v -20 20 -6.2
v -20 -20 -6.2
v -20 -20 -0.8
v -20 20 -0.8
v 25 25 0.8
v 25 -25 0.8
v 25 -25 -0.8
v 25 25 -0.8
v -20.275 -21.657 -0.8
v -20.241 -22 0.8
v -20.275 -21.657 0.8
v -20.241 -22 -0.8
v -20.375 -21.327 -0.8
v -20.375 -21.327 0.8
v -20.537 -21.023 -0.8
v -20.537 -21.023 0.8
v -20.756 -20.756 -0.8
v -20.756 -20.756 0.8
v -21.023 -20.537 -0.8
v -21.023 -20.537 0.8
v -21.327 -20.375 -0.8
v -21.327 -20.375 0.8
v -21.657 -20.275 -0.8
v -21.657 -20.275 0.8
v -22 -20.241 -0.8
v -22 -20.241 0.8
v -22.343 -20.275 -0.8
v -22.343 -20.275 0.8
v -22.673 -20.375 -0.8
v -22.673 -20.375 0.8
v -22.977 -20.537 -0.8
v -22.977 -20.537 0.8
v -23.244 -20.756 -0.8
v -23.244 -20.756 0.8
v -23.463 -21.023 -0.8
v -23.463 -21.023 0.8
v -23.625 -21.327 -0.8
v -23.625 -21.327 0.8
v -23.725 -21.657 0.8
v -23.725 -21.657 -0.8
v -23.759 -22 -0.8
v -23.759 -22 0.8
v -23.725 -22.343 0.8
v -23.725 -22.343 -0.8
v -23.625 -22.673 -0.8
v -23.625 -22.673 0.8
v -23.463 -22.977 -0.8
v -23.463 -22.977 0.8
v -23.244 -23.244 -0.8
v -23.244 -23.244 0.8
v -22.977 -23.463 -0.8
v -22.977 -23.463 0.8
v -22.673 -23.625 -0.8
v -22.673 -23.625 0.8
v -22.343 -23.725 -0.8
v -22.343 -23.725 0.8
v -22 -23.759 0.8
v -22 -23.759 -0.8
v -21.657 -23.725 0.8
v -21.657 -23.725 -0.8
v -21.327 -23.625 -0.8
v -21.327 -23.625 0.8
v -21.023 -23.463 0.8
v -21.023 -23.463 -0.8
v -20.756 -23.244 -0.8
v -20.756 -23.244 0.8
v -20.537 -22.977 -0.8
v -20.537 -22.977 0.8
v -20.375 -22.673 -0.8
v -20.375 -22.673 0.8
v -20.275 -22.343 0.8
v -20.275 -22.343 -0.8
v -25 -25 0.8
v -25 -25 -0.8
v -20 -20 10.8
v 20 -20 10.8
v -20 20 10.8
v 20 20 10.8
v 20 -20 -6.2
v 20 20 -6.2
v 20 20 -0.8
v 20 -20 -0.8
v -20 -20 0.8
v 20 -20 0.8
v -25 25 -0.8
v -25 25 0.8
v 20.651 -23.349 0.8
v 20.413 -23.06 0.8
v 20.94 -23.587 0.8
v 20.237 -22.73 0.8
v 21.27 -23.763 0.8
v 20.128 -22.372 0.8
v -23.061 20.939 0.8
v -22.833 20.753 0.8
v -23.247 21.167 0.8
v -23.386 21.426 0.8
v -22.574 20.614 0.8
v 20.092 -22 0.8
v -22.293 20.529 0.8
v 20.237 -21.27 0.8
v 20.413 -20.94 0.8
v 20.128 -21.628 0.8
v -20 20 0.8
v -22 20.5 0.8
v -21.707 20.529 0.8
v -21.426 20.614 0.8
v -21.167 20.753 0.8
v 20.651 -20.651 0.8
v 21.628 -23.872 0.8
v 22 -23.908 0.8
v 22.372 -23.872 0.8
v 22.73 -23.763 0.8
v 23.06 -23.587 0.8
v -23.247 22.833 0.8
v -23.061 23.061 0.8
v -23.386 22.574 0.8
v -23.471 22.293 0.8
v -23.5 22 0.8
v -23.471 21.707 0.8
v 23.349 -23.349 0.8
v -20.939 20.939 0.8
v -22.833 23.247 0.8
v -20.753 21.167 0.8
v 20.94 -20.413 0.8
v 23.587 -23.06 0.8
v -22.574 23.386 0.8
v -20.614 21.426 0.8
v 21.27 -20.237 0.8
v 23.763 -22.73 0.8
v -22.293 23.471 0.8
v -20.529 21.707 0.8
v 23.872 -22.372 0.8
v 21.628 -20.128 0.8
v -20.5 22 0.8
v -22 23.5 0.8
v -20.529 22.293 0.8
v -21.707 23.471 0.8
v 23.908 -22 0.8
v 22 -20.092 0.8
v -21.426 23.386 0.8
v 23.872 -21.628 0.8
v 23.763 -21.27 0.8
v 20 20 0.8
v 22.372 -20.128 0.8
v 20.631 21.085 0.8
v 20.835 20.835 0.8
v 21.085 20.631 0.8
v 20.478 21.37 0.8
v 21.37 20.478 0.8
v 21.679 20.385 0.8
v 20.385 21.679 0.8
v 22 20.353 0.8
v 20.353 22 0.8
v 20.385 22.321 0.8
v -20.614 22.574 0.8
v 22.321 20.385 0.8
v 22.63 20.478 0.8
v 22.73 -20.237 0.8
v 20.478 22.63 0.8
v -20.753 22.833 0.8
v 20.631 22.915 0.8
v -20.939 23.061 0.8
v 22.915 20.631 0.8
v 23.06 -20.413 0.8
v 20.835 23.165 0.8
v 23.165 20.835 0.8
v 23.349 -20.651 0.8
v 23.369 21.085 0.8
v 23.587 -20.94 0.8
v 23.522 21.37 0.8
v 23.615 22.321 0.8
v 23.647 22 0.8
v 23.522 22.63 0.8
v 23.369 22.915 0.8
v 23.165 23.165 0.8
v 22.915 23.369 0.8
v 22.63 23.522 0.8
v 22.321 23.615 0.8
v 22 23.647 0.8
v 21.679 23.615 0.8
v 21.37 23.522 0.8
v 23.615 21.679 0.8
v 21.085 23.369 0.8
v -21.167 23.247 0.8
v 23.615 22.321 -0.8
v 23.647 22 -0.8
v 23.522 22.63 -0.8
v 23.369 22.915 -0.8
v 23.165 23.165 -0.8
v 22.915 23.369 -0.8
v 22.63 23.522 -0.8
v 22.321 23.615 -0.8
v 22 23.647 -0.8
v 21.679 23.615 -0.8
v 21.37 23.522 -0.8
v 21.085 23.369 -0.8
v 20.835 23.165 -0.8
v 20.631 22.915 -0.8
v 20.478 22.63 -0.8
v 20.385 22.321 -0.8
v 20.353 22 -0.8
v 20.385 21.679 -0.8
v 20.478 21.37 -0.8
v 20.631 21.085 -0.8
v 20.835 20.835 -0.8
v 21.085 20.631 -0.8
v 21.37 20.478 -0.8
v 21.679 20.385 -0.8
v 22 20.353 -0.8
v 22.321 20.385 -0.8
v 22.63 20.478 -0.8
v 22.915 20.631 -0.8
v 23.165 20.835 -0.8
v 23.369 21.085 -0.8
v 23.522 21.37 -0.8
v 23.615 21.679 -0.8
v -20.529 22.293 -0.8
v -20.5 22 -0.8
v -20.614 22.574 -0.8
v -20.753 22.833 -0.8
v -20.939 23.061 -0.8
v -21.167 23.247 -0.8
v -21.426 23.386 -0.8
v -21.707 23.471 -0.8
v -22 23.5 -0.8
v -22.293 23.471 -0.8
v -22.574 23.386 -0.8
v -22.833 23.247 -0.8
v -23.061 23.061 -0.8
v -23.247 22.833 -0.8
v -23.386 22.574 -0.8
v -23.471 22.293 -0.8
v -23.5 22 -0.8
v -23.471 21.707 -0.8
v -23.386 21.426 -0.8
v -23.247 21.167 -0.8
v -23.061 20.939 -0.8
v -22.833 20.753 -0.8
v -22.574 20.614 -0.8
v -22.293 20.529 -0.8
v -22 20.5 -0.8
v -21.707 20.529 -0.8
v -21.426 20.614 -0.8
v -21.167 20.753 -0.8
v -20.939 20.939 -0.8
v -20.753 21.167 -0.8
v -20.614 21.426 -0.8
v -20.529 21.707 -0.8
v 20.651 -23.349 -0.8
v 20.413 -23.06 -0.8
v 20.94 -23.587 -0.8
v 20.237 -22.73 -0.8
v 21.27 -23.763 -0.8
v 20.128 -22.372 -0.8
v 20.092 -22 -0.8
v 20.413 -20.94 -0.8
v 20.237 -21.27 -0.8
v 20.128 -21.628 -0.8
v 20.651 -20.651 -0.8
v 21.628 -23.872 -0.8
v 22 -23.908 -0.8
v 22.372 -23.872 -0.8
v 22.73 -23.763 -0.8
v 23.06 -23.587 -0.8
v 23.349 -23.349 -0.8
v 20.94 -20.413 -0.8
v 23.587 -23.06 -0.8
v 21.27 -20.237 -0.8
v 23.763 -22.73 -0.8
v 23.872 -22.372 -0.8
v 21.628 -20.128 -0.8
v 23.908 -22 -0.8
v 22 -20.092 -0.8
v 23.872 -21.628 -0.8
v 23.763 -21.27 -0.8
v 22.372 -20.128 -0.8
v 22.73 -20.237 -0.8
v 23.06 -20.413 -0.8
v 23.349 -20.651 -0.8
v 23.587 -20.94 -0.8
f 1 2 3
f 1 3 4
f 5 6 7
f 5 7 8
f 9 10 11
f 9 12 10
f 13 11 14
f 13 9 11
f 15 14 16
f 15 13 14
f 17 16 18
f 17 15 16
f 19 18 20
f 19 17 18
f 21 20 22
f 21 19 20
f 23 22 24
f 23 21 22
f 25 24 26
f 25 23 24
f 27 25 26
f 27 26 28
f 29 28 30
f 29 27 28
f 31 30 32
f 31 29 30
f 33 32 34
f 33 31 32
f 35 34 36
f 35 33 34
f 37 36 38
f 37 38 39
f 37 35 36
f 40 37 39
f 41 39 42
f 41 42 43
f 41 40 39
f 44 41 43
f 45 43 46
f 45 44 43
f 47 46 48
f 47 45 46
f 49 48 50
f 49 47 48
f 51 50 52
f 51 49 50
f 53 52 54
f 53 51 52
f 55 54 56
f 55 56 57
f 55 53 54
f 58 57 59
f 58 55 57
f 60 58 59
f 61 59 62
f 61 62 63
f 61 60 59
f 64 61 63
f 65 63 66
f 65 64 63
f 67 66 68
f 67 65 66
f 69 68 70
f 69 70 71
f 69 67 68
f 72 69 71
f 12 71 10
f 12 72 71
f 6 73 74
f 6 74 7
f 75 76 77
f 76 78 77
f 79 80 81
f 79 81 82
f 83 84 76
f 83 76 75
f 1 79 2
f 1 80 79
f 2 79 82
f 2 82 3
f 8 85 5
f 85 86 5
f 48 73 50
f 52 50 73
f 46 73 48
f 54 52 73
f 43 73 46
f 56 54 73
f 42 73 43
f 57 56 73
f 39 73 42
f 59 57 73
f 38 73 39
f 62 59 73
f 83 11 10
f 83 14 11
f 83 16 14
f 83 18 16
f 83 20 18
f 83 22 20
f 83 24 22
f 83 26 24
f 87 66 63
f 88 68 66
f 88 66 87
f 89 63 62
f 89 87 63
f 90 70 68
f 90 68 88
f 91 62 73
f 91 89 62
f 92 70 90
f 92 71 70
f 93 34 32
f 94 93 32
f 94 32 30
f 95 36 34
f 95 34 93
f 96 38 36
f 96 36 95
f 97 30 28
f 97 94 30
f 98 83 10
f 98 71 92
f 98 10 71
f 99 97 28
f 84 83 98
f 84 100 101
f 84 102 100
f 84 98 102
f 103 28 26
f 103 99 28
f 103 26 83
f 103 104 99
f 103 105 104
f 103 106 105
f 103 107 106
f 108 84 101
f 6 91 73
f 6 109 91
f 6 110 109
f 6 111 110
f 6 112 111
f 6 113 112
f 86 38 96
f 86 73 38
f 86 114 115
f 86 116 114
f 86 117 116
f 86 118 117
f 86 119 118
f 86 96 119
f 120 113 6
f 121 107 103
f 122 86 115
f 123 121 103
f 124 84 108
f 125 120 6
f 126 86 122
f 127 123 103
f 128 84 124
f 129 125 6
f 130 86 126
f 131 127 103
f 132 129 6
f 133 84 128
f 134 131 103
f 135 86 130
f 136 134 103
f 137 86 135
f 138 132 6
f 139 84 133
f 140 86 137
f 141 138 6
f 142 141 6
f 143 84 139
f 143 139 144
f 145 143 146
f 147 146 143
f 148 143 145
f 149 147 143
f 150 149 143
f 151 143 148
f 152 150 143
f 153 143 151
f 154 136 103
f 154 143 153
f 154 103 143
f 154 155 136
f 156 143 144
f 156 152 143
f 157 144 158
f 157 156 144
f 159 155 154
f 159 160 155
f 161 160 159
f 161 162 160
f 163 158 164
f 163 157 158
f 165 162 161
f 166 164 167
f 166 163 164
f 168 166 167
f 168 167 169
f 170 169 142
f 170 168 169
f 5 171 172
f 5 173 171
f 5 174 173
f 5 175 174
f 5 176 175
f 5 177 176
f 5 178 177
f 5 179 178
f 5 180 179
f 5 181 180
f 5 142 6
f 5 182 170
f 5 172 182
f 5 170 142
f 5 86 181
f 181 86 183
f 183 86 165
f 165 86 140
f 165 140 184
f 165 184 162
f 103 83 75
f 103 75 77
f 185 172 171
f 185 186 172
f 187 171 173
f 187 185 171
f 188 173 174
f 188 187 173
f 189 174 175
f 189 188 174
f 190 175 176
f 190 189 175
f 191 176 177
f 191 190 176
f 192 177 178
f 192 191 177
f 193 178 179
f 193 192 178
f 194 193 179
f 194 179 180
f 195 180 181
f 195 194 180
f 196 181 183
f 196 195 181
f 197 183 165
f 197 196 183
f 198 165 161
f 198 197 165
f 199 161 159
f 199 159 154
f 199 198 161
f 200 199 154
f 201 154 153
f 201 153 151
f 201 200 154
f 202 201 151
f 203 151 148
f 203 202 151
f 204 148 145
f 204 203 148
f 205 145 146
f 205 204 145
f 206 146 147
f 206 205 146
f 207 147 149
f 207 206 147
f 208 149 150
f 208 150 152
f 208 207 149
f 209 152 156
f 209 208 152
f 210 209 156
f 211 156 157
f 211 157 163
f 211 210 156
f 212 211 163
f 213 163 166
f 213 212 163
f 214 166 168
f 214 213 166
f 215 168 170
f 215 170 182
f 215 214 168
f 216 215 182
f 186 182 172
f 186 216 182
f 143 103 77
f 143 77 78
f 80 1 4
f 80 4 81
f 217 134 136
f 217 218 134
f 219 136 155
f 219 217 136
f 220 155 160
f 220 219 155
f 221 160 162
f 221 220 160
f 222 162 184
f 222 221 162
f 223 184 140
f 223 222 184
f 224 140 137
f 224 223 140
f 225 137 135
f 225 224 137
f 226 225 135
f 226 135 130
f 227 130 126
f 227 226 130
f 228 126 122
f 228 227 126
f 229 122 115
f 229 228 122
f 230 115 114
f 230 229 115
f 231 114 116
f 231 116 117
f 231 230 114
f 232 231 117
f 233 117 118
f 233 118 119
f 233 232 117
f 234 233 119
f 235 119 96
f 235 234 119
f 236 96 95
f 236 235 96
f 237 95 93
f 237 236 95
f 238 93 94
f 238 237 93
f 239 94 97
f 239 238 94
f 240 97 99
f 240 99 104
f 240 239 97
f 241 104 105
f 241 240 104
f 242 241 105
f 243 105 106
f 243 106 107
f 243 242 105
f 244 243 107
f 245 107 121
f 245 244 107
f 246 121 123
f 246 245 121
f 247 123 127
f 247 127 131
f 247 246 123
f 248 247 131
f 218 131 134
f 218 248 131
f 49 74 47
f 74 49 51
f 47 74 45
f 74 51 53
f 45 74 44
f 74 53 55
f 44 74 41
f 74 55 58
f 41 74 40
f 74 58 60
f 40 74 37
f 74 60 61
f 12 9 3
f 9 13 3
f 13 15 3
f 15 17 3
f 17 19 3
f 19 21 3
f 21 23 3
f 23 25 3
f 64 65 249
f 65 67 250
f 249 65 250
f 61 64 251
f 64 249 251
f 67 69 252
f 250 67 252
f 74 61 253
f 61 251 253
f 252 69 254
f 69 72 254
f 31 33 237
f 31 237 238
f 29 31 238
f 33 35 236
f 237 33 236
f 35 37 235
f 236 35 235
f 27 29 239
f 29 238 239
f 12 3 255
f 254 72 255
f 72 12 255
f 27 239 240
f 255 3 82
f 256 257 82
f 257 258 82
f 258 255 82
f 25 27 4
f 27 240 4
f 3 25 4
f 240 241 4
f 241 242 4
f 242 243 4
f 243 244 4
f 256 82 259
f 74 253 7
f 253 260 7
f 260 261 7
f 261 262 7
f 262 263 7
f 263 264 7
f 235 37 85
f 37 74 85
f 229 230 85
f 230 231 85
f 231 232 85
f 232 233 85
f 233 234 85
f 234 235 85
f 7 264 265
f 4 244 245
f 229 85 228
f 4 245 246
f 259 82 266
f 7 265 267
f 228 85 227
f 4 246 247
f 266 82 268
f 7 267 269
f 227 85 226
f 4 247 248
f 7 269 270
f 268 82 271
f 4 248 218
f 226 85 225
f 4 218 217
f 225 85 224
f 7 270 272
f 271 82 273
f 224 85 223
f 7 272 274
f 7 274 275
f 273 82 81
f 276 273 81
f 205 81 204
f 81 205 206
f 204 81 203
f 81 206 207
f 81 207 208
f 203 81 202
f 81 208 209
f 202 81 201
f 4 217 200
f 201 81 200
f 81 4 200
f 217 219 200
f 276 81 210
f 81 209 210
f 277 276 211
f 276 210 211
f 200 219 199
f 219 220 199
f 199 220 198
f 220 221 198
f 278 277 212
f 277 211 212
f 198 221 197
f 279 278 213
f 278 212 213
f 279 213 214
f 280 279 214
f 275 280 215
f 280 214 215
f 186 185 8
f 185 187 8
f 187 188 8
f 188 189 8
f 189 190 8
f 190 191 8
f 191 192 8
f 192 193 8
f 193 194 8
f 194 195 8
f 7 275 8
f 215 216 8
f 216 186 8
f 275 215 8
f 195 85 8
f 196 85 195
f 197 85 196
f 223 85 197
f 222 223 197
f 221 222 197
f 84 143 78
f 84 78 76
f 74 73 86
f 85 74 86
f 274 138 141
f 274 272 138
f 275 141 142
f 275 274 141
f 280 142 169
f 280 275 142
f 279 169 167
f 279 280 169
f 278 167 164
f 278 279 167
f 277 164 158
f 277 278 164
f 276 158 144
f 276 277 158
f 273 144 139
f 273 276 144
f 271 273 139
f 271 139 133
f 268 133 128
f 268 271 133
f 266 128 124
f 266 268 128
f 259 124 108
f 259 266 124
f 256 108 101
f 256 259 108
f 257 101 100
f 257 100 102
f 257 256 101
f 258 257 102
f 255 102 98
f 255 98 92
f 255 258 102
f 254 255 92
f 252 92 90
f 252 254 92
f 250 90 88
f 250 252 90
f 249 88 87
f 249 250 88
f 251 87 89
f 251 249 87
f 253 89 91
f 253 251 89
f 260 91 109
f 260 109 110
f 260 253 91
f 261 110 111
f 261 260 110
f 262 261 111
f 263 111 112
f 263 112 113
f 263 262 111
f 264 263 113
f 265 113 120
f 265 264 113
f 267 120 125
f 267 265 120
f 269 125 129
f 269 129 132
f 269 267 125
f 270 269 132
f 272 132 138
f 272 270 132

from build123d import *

# Parameters (mm, degrees)
SKETCH1_W           = 50
SKETCH1_H           = 50
SKETCH1_R           = 1.5
SKETCH1_R_2         = 1.646935024
SKETCH1_R_3         = 1.908192471
SKETCH1_R_4         = 1.759080553
EXTRUDE2_DEPTH      = 0.8
EXTRUDE3_DEPTH      = 10
EXTRUDE3_DEPTH_BACK = 7


with BuildPart() as part:
    # Sketch1 → Extrude2 (new, symmetric)
    with BuildSketch(Plane.XY):
        Rectangle(SKETCH1_W, SKETCH1_H)
        with Locations((-22, 22)):
            Circle(SKETCH1_R, mode=Mode.SUBTRACT)
        with Locations((22, 22)):
            Circle(SKETCH1_R_2, mode=Mode.SUBTRACT)
        with Locations((22, -22)):
            Circle(SKETCH1_R_3, mode=Mode.SUBTRACT)
        with Locations((-22, -22)):
            Circle(SKETCH1_R_4, mode=Mode.SUBTRACT)
    extrude(amount=EXTRUDE2_DEPTH, both=True)

    # Sketch2 → Extrude3 (add, two sides: drawn at the far end of the back side and taken through both)
    with BuildSketch(Plane.XY.offset(0.8).offset(-EXTRUDE3_DEPTH_BACK)):
        Polygon((-20, 20), (20, -20), (-20, -20), align=None)
        Polygon((-20, 20), (20, 20), (20, -20), align=None)
    extrude(amount=EXTRUDE3_DEPTH + EXTRUDE3_DEPTH_BACK)


solid = part.part
